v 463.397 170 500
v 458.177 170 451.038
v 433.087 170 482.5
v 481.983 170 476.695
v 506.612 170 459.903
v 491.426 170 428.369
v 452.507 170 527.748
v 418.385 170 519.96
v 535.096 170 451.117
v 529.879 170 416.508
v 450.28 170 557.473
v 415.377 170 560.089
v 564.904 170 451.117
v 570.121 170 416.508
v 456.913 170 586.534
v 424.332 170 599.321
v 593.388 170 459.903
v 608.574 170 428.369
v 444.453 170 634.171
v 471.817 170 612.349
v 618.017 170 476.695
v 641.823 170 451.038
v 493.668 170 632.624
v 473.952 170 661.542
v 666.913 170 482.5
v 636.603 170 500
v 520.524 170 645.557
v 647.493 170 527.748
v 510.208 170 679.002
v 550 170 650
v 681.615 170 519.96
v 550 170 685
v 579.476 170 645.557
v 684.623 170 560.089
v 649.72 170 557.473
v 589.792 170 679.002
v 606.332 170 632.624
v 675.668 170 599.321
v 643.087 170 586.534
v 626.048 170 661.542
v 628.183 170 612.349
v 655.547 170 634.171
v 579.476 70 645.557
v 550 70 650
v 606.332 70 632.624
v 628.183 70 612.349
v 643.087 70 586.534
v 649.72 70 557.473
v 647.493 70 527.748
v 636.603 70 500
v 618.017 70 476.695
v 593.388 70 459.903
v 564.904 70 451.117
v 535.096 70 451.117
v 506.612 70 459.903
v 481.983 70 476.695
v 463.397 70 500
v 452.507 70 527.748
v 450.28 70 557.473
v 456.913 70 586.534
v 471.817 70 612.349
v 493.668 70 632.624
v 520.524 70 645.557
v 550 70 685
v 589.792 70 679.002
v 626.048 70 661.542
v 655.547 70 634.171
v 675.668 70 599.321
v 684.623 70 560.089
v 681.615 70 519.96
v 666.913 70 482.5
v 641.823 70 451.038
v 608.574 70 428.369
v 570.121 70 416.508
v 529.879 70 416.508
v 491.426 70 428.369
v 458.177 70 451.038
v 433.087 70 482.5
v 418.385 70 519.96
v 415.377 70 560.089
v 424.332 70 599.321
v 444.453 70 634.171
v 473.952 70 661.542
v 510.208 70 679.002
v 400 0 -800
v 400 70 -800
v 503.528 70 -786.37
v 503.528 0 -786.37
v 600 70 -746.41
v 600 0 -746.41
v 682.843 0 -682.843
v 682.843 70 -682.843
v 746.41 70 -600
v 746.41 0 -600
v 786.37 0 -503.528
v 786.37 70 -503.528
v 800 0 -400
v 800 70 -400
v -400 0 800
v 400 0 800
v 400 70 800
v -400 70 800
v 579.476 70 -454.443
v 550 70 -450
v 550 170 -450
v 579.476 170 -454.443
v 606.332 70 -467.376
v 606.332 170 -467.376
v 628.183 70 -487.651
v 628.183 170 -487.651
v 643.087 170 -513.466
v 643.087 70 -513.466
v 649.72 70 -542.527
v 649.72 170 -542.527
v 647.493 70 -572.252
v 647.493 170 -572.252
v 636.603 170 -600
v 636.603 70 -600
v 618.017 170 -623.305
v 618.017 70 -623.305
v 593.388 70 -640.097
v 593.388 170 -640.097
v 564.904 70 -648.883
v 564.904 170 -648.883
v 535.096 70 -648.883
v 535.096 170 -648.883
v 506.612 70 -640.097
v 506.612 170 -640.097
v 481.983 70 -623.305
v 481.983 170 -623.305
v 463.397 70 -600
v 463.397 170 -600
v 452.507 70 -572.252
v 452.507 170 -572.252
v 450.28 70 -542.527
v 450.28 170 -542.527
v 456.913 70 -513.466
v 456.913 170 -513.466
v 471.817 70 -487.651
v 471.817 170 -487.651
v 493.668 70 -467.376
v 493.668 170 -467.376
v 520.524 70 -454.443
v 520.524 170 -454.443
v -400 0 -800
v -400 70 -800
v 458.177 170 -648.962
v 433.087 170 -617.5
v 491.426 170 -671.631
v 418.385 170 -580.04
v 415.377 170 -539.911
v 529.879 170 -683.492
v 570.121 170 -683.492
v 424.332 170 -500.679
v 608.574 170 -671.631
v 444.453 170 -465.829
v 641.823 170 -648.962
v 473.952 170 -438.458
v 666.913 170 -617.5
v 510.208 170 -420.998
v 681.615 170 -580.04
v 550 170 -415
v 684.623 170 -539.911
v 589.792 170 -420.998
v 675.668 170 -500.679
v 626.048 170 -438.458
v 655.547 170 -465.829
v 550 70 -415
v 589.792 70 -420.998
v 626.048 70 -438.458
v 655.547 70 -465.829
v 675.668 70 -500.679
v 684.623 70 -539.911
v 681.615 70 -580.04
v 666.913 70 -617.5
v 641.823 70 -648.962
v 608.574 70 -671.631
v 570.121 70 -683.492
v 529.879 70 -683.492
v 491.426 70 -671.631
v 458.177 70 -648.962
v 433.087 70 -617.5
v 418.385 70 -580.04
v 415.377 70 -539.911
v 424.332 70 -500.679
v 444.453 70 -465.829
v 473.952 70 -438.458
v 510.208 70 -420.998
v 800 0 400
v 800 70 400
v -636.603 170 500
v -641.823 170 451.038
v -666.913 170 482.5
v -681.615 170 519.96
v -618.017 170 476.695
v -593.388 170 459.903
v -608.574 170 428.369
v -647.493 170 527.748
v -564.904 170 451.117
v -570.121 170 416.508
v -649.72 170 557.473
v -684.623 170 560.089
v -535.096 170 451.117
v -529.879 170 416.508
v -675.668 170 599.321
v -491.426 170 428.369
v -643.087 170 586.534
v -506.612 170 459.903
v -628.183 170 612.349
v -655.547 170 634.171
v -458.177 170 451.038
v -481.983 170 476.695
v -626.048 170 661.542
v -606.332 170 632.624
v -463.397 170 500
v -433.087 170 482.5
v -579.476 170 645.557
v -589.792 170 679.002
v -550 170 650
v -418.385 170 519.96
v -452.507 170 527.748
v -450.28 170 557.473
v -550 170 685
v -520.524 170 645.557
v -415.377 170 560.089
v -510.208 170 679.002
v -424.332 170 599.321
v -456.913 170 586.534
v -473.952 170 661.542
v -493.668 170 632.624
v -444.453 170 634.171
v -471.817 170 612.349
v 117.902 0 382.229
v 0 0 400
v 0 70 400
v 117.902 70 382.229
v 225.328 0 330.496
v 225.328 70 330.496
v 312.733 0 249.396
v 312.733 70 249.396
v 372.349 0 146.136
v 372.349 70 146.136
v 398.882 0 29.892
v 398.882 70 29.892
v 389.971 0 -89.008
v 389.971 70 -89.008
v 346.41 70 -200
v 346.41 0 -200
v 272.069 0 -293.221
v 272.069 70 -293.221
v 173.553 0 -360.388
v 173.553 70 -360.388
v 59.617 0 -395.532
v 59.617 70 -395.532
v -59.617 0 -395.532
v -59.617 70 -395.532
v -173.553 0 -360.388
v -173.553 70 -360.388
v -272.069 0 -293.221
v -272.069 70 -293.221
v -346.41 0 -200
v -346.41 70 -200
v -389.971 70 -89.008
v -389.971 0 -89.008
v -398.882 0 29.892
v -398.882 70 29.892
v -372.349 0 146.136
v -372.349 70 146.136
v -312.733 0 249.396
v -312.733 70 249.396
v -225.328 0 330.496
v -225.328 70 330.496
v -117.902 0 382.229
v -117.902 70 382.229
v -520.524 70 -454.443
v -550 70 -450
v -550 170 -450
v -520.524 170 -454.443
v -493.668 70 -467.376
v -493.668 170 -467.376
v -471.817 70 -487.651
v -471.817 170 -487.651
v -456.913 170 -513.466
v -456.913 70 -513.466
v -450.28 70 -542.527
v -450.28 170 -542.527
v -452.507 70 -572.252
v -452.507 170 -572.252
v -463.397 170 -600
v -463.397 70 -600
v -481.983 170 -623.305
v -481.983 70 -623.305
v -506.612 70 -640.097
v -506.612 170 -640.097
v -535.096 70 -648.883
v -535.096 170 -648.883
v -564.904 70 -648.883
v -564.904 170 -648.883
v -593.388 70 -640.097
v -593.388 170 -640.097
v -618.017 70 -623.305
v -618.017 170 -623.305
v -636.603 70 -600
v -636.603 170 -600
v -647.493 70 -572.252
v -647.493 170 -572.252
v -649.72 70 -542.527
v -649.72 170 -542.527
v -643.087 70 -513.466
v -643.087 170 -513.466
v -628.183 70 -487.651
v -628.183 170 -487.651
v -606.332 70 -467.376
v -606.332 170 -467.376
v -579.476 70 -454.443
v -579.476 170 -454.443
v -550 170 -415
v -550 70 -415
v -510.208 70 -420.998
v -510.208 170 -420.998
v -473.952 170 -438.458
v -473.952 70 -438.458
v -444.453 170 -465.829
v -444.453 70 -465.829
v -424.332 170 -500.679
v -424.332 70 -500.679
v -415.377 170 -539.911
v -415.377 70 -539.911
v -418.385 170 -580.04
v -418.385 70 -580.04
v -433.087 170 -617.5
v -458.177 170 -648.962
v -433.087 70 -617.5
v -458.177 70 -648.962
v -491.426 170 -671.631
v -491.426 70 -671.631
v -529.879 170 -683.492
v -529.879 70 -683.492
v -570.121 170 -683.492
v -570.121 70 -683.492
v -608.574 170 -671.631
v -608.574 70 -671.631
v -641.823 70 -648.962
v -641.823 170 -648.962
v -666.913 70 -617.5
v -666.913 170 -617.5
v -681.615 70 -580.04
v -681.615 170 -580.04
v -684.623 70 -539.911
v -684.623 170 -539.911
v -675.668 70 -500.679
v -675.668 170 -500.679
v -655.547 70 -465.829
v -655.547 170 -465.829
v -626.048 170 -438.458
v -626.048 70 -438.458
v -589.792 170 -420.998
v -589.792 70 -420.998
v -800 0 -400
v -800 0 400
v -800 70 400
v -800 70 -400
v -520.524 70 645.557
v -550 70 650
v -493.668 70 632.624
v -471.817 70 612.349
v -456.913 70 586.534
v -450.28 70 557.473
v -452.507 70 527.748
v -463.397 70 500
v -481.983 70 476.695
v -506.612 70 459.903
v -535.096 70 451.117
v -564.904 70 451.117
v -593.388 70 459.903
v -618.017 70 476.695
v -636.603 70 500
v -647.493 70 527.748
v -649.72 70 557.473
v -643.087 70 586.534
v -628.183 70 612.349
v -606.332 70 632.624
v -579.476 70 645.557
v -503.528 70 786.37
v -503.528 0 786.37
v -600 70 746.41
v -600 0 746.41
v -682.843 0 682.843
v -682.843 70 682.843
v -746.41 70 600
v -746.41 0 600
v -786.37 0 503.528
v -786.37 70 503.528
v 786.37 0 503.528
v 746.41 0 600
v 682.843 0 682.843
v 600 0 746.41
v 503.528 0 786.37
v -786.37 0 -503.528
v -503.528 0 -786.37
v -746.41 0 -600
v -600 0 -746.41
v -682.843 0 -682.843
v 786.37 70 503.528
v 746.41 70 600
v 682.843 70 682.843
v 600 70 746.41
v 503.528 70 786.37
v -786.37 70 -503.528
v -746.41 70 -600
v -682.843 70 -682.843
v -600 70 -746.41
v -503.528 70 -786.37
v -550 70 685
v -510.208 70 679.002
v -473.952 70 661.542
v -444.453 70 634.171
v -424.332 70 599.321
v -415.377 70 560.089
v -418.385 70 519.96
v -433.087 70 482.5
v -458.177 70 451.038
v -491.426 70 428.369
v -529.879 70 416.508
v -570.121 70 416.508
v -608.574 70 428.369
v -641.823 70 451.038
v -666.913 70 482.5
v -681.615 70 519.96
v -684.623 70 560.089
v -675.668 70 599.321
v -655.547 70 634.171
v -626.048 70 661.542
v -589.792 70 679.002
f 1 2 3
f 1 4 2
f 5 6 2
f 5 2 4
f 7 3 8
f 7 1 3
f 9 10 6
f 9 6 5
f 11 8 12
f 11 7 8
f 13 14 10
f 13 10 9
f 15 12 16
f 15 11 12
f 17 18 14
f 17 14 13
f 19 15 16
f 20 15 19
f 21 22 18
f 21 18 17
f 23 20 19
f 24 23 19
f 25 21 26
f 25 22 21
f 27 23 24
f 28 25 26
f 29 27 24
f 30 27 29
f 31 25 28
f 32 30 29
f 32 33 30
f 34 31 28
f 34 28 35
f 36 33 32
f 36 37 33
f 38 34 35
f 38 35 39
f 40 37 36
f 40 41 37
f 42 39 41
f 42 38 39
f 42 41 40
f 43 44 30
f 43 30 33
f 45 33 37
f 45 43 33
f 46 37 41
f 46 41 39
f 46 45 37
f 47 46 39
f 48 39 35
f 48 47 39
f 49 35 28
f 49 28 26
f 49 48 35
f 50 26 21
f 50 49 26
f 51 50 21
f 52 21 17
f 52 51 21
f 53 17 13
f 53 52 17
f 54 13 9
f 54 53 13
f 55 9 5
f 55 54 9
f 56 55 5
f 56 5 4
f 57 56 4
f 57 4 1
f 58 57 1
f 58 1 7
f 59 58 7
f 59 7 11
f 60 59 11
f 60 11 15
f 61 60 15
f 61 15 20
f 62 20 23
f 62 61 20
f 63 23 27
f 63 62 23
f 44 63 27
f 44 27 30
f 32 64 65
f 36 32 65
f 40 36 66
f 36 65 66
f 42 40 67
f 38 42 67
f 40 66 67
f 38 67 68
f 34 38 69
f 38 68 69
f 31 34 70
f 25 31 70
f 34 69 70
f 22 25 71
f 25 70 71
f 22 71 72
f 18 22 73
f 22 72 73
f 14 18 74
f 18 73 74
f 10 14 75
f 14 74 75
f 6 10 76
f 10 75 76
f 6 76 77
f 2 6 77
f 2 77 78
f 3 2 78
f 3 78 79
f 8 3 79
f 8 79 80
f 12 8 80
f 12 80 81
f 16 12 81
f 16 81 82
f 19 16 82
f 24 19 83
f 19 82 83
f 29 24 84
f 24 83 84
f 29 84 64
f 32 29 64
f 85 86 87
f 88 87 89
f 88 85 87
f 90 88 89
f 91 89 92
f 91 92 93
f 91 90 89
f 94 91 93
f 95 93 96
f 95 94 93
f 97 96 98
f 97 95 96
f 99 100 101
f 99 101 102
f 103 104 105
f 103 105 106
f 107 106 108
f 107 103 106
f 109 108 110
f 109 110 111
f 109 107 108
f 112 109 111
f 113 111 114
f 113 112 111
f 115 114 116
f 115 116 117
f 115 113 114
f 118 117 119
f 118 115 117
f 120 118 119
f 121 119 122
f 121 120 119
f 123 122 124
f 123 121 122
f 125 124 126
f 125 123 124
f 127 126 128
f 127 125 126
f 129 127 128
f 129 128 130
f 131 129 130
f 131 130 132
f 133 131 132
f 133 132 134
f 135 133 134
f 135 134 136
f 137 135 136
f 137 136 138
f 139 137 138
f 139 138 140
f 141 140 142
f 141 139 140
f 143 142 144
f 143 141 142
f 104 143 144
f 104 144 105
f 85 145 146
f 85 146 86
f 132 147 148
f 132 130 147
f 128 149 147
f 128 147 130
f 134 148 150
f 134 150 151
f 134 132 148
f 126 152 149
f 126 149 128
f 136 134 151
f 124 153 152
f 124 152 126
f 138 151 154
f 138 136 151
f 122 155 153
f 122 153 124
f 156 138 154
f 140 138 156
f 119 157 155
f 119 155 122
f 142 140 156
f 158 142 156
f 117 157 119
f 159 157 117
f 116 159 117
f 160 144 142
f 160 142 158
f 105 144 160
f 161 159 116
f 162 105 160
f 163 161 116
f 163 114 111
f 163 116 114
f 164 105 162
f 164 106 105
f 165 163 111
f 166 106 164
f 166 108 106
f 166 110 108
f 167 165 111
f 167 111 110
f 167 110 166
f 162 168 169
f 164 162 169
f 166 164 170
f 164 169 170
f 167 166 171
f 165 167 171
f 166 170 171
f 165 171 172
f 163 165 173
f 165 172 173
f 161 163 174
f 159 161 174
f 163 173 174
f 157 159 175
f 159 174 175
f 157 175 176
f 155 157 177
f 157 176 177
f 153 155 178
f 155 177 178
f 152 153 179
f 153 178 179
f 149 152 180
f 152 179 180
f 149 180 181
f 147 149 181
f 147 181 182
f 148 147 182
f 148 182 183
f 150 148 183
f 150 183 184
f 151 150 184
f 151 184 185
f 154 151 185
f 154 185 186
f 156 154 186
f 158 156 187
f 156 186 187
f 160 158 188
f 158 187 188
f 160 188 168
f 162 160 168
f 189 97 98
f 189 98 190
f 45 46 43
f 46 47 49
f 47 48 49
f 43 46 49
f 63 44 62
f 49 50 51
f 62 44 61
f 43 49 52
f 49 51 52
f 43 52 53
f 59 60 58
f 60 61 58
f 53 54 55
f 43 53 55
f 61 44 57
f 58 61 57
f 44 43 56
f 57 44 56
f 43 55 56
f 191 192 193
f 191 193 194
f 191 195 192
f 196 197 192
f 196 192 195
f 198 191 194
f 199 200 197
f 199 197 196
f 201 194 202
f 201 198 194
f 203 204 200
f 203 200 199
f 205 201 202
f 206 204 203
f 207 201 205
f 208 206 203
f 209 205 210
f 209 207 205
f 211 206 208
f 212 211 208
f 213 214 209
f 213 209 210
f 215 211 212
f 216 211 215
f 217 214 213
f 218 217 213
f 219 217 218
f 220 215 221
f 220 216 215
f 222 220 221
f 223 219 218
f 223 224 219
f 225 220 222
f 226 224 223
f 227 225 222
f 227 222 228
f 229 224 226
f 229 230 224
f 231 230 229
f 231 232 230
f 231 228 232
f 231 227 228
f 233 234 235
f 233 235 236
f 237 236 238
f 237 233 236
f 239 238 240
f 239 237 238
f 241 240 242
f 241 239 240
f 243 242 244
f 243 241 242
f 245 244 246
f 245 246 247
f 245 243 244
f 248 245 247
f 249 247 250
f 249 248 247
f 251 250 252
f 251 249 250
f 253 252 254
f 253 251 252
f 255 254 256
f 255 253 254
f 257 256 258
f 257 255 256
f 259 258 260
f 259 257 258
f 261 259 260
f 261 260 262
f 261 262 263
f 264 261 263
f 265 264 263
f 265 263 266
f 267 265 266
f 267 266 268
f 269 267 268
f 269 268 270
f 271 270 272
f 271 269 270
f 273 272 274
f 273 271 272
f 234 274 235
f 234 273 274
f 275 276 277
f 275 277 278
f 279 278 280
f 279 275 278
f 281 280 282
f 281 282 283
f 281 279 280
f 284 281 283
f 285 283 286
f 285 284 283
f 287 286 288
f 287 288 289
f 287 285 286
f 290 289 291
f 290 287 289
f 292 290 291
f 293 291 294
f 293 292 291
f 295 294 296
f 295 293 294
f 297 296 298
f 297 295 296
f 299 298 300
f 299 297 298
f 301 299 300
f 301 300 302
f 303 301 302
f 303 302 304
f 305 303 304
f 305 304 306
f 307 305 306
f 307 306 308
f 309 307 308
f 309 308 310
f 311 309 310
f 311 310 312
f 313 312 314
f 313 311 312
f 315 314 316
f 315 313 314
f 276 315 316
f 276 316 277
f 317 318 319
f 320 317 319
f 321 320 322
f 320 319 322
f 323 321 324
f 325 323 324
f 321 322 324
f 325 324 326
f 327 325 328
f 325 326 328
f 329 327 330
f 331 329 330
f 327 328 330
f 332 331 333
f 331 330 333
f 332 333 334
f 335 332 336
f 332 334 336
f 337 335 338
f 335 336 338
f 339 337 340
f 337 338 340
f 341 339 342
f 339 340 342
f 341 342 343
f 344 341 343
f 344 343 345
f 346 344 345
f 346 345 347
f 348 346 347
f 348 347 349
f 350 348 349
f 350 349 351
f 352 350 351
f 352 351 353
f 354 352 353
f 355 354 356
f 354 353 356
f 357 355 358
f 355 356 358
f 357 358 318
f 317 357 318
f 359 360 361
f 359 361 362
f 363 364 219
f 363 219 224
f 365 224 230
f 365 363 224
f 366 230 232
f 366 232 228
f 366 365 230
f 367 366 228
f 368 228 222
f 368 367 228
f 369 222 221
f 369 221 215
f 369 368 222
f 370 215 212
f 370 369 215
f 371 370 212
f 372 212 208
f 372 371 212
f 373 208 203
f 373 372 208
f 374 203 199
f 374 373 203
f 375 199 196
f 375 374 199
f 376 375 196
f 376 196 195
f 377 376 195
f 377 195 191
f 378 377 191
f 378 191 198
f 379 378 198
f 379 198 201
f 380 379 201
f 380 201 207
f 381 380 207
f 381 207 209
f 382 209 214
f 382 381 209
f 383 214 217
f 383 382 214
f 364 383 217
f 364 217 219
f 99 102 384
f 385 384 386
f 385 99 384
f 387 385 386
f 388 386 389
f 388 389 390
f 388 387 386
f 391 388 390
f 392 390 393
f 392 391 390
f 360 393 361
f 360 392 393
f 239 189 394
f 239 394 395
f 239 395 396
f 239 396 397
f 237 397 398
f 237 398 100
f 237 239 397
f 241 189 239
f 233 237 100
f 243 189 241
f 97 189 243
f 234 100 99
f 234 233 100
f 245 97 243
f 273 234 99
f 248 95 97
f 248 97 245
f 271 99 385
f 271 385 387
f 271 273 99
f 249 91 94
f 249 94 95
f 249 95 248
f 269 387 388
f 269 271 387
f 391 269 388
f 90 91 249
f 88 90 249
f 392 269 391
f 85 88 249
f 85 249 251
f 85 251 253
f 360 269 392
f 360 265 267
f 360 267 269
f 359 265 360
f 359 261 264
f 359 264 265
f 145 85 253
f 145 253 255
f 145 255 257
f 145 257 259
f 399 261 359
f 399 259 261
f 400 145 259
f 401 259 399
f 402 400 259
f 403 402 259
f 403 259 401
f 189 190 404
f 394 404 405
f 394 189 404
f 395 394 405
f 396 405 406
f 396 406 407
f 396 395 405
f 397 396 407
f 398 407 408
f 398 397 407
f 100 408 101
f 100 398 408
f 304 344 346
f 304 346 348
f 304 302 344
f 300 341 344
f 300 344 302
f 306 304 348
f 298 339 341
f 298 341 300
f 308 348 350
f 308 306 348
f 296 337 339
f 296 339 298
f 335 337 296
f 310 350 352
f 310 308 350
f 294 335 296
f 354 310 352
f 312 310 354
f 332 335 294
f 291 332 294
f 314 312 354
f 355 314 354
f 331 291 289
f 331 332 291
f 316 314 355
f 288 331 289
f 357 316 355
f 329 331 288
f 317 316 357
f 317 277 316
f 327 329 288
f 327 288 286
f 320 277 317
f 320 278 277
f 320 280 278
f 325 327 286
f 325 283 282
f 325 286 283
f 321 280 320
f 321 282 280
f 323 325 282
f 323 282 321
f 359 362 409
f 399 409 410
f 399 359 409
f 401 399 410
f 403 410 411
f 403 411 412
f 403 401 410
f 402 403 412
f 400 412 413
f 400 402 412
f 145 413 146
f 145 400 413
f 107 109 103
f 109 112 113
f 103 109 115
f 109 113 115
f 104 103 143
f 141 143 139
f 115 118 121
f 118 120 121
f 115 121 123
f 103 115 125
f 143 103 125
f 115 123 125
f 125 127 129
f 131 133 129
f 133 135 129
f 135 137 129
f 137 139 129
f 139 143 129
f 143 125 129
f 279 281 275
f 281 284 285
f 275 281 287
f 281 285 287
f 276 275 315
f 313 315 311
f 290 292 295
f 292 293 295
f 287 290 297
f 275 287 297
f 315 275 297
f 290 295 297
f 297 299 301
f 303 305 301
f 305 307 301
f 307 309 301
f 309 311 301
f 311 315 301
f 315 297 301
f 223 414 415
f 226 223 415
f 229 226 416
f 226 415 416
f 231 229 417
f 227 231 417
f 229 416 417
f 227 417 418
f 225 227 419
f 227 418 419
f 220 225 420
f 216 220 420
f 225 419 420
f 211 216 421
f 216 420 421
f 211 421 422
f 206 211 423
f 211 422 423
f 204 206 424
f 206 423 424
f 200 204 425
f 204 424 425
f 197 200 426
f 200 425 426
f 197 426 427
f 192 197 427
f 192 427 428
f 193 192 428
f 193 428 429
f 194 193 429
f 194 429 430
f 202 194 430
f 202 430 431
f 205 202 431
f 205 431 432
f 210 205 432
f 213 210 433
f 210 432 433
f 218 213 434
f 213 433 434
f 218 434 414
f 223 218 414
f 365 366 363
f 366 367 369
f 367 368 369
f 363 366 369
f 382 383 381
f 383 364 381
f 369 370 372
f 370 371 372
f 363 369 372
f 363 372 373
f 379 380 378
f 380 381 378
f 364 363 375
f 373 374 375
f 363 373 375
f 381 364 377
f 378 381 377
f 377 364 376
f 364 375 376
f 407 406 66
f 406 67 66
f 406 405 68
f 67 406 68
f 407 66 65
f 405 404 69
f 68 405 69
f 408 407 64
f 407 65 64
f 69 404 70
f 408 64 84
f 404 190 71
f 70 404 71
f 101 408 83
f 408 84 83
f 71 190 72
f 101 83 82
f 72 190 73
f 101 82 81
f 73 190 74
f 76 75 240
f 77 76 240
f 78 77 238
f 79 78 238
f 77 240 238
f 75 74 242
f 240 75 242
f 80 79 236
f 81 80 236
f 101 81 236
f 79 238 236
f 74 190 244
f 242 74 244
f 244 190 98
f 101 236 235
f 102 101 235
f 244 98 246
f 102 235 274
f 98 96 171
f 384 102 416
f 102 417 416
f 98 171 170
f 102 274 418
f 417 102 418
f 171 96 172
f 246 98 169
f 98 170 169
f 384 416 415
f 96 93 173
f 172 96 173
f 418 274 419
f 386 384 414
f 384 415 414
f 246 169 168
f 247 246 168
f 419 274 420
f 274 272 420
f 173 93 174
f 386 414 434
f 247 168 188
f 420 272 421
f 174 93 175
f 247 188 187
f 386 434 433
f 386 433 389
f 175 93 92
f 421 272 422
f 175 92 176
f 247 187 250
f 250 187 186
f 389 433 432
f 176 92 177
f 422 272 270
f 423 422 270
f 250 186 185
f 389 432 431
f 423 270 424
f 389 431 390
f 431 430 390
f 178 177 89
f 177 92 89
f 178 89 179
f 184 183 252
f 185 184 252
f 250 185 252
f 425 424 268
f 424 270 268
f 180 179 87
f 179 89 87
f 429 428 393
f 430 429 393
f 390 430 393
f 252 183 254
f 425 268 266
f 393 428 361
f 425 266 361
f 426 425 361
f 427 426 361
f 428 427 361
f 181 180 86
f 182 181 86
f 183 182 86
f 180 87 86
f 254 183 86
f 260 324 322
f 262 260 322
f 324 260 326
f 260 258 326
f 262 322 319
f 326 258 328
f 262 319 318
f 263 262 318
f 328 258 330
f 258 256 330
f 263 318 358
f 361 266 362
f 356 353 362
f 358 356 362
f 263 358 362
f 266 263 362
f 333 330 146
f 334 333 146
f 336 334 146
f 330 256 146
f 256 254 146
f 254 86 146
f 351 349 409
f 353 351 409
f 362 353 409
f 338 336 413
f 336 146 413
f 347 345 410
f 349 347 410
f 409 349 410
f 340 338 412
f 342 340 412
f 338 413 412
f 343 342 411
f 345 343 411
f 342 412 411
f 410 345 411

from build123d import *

# Parameters (mm, degrees)
IZIM1_R                     = 400
Y_KSEKLIK_EKSTR_ZYON1_DEPTH = 70
IZIM2_R                     = 135
IZIM2_R_2                   = 100
Y_KSEKLIK_EKSTR_ZYON2_DEPTH = 100


with BuildPart() as part:
    # Çizim1 → Yükseklik-Ekstrüzyon1 (new body)
    with BuildSketch(Plane(origin=(0, 0, 0), x_dir=(1, 0, 0), z_dir=(0, 1, 0))):
        with BuildLine():
            Line((800, 400), (800, -400))
            ThreePointArc((800, -400), (682.842712475, -682.842712475), (400, -800))
            Line((400, -800), (-400, -800))
            ThreePointArc((-400, -800), (-682.842712475, -682.842712475), (-800, -400))
            Line((-800, -400), (-800, 400))
            ThreePointArc((-800, 400), (-682.842712475, 682.842712475), (-400, 800))
            Line((-400, 800), (400, 800))
            ThreePointArc((400, 800), (682.842712475, 682.842712475), (800, 400))
        make_face()
        with Locations(Location((0, 0, 0), (0, 0, 270))):
            Circle(IZIM1_R, mode=Mode.SUBTRACT)
    extrude(amount=Y_KSEKLIK_EKSTR_ZYON1_DEPTH)

    # Çizim2 → Yükseklik-Ekstrüzyon2 (add)
    # profile 1 of 4: a face of its own
    with BuildSketch(Plane(origin=(0, 70, 0), x_dir=(1, 0, 0), z_dir=(0, 1, 0))):
        with Locations(Location((-550, 550, 0), (0, 0, 270))):
            Circle(IZIM2_R)
        with Locations(Location((-550, 550, 0), (0, 0, 270))):
            Circle(IZIM2_R_2, mode=Mode.SUBTRACT)
    # profile 2 of 4: a face of its own
    with BuildSketch(Plane(origin=(0, 70, 0), x_dir=(1, 0, 0), z_dir=(0, 1, 0))):
        with Locations(Location((550, 550, 0), (0, 0, 270))):
            Circle(IZIM2_R)
        with Locations(Location((550, 550, 0), (0, 0, 270))):
            Circle(IZIM2_R_2, mode=Mode.SUBTRACT)
    # profile 3 of 4: a face of its own
    with BuildSketch(Plane(origin=(0, 70, 0), x_dir=(1, 0, 0), z_dir=(0, 1, 0))):
        with Locations(Location((-550, -550, 0), (0, 0, 270))):
            Circle(IZIM2_R)
        with Locations(Location((-550, -550, 0), (0, 0, 270))):
            Circle(IZIM2_R_2, mode=Mode.SUBTRACT)
    # profile 4 of 4: a face of its own
    with BuildSketch(Plane(origin=(0, 70, 0), x_dir=(1, 0, 0), z_dir=(0, 1, 0))):
        with Locations(Location((550, -550, 0), (0, 0, 270))):
            Circle(IZIM2_R)
        with Locations(Location((550, -550, 0), (0, 0, 270))):
            Circle(IZIM2_R_2, mode=Mode.SUBTRACT)
    extrude(amount=Y_KSEKLIK_EKSTR_ZYON2_DEPTH)


solid = part.part
